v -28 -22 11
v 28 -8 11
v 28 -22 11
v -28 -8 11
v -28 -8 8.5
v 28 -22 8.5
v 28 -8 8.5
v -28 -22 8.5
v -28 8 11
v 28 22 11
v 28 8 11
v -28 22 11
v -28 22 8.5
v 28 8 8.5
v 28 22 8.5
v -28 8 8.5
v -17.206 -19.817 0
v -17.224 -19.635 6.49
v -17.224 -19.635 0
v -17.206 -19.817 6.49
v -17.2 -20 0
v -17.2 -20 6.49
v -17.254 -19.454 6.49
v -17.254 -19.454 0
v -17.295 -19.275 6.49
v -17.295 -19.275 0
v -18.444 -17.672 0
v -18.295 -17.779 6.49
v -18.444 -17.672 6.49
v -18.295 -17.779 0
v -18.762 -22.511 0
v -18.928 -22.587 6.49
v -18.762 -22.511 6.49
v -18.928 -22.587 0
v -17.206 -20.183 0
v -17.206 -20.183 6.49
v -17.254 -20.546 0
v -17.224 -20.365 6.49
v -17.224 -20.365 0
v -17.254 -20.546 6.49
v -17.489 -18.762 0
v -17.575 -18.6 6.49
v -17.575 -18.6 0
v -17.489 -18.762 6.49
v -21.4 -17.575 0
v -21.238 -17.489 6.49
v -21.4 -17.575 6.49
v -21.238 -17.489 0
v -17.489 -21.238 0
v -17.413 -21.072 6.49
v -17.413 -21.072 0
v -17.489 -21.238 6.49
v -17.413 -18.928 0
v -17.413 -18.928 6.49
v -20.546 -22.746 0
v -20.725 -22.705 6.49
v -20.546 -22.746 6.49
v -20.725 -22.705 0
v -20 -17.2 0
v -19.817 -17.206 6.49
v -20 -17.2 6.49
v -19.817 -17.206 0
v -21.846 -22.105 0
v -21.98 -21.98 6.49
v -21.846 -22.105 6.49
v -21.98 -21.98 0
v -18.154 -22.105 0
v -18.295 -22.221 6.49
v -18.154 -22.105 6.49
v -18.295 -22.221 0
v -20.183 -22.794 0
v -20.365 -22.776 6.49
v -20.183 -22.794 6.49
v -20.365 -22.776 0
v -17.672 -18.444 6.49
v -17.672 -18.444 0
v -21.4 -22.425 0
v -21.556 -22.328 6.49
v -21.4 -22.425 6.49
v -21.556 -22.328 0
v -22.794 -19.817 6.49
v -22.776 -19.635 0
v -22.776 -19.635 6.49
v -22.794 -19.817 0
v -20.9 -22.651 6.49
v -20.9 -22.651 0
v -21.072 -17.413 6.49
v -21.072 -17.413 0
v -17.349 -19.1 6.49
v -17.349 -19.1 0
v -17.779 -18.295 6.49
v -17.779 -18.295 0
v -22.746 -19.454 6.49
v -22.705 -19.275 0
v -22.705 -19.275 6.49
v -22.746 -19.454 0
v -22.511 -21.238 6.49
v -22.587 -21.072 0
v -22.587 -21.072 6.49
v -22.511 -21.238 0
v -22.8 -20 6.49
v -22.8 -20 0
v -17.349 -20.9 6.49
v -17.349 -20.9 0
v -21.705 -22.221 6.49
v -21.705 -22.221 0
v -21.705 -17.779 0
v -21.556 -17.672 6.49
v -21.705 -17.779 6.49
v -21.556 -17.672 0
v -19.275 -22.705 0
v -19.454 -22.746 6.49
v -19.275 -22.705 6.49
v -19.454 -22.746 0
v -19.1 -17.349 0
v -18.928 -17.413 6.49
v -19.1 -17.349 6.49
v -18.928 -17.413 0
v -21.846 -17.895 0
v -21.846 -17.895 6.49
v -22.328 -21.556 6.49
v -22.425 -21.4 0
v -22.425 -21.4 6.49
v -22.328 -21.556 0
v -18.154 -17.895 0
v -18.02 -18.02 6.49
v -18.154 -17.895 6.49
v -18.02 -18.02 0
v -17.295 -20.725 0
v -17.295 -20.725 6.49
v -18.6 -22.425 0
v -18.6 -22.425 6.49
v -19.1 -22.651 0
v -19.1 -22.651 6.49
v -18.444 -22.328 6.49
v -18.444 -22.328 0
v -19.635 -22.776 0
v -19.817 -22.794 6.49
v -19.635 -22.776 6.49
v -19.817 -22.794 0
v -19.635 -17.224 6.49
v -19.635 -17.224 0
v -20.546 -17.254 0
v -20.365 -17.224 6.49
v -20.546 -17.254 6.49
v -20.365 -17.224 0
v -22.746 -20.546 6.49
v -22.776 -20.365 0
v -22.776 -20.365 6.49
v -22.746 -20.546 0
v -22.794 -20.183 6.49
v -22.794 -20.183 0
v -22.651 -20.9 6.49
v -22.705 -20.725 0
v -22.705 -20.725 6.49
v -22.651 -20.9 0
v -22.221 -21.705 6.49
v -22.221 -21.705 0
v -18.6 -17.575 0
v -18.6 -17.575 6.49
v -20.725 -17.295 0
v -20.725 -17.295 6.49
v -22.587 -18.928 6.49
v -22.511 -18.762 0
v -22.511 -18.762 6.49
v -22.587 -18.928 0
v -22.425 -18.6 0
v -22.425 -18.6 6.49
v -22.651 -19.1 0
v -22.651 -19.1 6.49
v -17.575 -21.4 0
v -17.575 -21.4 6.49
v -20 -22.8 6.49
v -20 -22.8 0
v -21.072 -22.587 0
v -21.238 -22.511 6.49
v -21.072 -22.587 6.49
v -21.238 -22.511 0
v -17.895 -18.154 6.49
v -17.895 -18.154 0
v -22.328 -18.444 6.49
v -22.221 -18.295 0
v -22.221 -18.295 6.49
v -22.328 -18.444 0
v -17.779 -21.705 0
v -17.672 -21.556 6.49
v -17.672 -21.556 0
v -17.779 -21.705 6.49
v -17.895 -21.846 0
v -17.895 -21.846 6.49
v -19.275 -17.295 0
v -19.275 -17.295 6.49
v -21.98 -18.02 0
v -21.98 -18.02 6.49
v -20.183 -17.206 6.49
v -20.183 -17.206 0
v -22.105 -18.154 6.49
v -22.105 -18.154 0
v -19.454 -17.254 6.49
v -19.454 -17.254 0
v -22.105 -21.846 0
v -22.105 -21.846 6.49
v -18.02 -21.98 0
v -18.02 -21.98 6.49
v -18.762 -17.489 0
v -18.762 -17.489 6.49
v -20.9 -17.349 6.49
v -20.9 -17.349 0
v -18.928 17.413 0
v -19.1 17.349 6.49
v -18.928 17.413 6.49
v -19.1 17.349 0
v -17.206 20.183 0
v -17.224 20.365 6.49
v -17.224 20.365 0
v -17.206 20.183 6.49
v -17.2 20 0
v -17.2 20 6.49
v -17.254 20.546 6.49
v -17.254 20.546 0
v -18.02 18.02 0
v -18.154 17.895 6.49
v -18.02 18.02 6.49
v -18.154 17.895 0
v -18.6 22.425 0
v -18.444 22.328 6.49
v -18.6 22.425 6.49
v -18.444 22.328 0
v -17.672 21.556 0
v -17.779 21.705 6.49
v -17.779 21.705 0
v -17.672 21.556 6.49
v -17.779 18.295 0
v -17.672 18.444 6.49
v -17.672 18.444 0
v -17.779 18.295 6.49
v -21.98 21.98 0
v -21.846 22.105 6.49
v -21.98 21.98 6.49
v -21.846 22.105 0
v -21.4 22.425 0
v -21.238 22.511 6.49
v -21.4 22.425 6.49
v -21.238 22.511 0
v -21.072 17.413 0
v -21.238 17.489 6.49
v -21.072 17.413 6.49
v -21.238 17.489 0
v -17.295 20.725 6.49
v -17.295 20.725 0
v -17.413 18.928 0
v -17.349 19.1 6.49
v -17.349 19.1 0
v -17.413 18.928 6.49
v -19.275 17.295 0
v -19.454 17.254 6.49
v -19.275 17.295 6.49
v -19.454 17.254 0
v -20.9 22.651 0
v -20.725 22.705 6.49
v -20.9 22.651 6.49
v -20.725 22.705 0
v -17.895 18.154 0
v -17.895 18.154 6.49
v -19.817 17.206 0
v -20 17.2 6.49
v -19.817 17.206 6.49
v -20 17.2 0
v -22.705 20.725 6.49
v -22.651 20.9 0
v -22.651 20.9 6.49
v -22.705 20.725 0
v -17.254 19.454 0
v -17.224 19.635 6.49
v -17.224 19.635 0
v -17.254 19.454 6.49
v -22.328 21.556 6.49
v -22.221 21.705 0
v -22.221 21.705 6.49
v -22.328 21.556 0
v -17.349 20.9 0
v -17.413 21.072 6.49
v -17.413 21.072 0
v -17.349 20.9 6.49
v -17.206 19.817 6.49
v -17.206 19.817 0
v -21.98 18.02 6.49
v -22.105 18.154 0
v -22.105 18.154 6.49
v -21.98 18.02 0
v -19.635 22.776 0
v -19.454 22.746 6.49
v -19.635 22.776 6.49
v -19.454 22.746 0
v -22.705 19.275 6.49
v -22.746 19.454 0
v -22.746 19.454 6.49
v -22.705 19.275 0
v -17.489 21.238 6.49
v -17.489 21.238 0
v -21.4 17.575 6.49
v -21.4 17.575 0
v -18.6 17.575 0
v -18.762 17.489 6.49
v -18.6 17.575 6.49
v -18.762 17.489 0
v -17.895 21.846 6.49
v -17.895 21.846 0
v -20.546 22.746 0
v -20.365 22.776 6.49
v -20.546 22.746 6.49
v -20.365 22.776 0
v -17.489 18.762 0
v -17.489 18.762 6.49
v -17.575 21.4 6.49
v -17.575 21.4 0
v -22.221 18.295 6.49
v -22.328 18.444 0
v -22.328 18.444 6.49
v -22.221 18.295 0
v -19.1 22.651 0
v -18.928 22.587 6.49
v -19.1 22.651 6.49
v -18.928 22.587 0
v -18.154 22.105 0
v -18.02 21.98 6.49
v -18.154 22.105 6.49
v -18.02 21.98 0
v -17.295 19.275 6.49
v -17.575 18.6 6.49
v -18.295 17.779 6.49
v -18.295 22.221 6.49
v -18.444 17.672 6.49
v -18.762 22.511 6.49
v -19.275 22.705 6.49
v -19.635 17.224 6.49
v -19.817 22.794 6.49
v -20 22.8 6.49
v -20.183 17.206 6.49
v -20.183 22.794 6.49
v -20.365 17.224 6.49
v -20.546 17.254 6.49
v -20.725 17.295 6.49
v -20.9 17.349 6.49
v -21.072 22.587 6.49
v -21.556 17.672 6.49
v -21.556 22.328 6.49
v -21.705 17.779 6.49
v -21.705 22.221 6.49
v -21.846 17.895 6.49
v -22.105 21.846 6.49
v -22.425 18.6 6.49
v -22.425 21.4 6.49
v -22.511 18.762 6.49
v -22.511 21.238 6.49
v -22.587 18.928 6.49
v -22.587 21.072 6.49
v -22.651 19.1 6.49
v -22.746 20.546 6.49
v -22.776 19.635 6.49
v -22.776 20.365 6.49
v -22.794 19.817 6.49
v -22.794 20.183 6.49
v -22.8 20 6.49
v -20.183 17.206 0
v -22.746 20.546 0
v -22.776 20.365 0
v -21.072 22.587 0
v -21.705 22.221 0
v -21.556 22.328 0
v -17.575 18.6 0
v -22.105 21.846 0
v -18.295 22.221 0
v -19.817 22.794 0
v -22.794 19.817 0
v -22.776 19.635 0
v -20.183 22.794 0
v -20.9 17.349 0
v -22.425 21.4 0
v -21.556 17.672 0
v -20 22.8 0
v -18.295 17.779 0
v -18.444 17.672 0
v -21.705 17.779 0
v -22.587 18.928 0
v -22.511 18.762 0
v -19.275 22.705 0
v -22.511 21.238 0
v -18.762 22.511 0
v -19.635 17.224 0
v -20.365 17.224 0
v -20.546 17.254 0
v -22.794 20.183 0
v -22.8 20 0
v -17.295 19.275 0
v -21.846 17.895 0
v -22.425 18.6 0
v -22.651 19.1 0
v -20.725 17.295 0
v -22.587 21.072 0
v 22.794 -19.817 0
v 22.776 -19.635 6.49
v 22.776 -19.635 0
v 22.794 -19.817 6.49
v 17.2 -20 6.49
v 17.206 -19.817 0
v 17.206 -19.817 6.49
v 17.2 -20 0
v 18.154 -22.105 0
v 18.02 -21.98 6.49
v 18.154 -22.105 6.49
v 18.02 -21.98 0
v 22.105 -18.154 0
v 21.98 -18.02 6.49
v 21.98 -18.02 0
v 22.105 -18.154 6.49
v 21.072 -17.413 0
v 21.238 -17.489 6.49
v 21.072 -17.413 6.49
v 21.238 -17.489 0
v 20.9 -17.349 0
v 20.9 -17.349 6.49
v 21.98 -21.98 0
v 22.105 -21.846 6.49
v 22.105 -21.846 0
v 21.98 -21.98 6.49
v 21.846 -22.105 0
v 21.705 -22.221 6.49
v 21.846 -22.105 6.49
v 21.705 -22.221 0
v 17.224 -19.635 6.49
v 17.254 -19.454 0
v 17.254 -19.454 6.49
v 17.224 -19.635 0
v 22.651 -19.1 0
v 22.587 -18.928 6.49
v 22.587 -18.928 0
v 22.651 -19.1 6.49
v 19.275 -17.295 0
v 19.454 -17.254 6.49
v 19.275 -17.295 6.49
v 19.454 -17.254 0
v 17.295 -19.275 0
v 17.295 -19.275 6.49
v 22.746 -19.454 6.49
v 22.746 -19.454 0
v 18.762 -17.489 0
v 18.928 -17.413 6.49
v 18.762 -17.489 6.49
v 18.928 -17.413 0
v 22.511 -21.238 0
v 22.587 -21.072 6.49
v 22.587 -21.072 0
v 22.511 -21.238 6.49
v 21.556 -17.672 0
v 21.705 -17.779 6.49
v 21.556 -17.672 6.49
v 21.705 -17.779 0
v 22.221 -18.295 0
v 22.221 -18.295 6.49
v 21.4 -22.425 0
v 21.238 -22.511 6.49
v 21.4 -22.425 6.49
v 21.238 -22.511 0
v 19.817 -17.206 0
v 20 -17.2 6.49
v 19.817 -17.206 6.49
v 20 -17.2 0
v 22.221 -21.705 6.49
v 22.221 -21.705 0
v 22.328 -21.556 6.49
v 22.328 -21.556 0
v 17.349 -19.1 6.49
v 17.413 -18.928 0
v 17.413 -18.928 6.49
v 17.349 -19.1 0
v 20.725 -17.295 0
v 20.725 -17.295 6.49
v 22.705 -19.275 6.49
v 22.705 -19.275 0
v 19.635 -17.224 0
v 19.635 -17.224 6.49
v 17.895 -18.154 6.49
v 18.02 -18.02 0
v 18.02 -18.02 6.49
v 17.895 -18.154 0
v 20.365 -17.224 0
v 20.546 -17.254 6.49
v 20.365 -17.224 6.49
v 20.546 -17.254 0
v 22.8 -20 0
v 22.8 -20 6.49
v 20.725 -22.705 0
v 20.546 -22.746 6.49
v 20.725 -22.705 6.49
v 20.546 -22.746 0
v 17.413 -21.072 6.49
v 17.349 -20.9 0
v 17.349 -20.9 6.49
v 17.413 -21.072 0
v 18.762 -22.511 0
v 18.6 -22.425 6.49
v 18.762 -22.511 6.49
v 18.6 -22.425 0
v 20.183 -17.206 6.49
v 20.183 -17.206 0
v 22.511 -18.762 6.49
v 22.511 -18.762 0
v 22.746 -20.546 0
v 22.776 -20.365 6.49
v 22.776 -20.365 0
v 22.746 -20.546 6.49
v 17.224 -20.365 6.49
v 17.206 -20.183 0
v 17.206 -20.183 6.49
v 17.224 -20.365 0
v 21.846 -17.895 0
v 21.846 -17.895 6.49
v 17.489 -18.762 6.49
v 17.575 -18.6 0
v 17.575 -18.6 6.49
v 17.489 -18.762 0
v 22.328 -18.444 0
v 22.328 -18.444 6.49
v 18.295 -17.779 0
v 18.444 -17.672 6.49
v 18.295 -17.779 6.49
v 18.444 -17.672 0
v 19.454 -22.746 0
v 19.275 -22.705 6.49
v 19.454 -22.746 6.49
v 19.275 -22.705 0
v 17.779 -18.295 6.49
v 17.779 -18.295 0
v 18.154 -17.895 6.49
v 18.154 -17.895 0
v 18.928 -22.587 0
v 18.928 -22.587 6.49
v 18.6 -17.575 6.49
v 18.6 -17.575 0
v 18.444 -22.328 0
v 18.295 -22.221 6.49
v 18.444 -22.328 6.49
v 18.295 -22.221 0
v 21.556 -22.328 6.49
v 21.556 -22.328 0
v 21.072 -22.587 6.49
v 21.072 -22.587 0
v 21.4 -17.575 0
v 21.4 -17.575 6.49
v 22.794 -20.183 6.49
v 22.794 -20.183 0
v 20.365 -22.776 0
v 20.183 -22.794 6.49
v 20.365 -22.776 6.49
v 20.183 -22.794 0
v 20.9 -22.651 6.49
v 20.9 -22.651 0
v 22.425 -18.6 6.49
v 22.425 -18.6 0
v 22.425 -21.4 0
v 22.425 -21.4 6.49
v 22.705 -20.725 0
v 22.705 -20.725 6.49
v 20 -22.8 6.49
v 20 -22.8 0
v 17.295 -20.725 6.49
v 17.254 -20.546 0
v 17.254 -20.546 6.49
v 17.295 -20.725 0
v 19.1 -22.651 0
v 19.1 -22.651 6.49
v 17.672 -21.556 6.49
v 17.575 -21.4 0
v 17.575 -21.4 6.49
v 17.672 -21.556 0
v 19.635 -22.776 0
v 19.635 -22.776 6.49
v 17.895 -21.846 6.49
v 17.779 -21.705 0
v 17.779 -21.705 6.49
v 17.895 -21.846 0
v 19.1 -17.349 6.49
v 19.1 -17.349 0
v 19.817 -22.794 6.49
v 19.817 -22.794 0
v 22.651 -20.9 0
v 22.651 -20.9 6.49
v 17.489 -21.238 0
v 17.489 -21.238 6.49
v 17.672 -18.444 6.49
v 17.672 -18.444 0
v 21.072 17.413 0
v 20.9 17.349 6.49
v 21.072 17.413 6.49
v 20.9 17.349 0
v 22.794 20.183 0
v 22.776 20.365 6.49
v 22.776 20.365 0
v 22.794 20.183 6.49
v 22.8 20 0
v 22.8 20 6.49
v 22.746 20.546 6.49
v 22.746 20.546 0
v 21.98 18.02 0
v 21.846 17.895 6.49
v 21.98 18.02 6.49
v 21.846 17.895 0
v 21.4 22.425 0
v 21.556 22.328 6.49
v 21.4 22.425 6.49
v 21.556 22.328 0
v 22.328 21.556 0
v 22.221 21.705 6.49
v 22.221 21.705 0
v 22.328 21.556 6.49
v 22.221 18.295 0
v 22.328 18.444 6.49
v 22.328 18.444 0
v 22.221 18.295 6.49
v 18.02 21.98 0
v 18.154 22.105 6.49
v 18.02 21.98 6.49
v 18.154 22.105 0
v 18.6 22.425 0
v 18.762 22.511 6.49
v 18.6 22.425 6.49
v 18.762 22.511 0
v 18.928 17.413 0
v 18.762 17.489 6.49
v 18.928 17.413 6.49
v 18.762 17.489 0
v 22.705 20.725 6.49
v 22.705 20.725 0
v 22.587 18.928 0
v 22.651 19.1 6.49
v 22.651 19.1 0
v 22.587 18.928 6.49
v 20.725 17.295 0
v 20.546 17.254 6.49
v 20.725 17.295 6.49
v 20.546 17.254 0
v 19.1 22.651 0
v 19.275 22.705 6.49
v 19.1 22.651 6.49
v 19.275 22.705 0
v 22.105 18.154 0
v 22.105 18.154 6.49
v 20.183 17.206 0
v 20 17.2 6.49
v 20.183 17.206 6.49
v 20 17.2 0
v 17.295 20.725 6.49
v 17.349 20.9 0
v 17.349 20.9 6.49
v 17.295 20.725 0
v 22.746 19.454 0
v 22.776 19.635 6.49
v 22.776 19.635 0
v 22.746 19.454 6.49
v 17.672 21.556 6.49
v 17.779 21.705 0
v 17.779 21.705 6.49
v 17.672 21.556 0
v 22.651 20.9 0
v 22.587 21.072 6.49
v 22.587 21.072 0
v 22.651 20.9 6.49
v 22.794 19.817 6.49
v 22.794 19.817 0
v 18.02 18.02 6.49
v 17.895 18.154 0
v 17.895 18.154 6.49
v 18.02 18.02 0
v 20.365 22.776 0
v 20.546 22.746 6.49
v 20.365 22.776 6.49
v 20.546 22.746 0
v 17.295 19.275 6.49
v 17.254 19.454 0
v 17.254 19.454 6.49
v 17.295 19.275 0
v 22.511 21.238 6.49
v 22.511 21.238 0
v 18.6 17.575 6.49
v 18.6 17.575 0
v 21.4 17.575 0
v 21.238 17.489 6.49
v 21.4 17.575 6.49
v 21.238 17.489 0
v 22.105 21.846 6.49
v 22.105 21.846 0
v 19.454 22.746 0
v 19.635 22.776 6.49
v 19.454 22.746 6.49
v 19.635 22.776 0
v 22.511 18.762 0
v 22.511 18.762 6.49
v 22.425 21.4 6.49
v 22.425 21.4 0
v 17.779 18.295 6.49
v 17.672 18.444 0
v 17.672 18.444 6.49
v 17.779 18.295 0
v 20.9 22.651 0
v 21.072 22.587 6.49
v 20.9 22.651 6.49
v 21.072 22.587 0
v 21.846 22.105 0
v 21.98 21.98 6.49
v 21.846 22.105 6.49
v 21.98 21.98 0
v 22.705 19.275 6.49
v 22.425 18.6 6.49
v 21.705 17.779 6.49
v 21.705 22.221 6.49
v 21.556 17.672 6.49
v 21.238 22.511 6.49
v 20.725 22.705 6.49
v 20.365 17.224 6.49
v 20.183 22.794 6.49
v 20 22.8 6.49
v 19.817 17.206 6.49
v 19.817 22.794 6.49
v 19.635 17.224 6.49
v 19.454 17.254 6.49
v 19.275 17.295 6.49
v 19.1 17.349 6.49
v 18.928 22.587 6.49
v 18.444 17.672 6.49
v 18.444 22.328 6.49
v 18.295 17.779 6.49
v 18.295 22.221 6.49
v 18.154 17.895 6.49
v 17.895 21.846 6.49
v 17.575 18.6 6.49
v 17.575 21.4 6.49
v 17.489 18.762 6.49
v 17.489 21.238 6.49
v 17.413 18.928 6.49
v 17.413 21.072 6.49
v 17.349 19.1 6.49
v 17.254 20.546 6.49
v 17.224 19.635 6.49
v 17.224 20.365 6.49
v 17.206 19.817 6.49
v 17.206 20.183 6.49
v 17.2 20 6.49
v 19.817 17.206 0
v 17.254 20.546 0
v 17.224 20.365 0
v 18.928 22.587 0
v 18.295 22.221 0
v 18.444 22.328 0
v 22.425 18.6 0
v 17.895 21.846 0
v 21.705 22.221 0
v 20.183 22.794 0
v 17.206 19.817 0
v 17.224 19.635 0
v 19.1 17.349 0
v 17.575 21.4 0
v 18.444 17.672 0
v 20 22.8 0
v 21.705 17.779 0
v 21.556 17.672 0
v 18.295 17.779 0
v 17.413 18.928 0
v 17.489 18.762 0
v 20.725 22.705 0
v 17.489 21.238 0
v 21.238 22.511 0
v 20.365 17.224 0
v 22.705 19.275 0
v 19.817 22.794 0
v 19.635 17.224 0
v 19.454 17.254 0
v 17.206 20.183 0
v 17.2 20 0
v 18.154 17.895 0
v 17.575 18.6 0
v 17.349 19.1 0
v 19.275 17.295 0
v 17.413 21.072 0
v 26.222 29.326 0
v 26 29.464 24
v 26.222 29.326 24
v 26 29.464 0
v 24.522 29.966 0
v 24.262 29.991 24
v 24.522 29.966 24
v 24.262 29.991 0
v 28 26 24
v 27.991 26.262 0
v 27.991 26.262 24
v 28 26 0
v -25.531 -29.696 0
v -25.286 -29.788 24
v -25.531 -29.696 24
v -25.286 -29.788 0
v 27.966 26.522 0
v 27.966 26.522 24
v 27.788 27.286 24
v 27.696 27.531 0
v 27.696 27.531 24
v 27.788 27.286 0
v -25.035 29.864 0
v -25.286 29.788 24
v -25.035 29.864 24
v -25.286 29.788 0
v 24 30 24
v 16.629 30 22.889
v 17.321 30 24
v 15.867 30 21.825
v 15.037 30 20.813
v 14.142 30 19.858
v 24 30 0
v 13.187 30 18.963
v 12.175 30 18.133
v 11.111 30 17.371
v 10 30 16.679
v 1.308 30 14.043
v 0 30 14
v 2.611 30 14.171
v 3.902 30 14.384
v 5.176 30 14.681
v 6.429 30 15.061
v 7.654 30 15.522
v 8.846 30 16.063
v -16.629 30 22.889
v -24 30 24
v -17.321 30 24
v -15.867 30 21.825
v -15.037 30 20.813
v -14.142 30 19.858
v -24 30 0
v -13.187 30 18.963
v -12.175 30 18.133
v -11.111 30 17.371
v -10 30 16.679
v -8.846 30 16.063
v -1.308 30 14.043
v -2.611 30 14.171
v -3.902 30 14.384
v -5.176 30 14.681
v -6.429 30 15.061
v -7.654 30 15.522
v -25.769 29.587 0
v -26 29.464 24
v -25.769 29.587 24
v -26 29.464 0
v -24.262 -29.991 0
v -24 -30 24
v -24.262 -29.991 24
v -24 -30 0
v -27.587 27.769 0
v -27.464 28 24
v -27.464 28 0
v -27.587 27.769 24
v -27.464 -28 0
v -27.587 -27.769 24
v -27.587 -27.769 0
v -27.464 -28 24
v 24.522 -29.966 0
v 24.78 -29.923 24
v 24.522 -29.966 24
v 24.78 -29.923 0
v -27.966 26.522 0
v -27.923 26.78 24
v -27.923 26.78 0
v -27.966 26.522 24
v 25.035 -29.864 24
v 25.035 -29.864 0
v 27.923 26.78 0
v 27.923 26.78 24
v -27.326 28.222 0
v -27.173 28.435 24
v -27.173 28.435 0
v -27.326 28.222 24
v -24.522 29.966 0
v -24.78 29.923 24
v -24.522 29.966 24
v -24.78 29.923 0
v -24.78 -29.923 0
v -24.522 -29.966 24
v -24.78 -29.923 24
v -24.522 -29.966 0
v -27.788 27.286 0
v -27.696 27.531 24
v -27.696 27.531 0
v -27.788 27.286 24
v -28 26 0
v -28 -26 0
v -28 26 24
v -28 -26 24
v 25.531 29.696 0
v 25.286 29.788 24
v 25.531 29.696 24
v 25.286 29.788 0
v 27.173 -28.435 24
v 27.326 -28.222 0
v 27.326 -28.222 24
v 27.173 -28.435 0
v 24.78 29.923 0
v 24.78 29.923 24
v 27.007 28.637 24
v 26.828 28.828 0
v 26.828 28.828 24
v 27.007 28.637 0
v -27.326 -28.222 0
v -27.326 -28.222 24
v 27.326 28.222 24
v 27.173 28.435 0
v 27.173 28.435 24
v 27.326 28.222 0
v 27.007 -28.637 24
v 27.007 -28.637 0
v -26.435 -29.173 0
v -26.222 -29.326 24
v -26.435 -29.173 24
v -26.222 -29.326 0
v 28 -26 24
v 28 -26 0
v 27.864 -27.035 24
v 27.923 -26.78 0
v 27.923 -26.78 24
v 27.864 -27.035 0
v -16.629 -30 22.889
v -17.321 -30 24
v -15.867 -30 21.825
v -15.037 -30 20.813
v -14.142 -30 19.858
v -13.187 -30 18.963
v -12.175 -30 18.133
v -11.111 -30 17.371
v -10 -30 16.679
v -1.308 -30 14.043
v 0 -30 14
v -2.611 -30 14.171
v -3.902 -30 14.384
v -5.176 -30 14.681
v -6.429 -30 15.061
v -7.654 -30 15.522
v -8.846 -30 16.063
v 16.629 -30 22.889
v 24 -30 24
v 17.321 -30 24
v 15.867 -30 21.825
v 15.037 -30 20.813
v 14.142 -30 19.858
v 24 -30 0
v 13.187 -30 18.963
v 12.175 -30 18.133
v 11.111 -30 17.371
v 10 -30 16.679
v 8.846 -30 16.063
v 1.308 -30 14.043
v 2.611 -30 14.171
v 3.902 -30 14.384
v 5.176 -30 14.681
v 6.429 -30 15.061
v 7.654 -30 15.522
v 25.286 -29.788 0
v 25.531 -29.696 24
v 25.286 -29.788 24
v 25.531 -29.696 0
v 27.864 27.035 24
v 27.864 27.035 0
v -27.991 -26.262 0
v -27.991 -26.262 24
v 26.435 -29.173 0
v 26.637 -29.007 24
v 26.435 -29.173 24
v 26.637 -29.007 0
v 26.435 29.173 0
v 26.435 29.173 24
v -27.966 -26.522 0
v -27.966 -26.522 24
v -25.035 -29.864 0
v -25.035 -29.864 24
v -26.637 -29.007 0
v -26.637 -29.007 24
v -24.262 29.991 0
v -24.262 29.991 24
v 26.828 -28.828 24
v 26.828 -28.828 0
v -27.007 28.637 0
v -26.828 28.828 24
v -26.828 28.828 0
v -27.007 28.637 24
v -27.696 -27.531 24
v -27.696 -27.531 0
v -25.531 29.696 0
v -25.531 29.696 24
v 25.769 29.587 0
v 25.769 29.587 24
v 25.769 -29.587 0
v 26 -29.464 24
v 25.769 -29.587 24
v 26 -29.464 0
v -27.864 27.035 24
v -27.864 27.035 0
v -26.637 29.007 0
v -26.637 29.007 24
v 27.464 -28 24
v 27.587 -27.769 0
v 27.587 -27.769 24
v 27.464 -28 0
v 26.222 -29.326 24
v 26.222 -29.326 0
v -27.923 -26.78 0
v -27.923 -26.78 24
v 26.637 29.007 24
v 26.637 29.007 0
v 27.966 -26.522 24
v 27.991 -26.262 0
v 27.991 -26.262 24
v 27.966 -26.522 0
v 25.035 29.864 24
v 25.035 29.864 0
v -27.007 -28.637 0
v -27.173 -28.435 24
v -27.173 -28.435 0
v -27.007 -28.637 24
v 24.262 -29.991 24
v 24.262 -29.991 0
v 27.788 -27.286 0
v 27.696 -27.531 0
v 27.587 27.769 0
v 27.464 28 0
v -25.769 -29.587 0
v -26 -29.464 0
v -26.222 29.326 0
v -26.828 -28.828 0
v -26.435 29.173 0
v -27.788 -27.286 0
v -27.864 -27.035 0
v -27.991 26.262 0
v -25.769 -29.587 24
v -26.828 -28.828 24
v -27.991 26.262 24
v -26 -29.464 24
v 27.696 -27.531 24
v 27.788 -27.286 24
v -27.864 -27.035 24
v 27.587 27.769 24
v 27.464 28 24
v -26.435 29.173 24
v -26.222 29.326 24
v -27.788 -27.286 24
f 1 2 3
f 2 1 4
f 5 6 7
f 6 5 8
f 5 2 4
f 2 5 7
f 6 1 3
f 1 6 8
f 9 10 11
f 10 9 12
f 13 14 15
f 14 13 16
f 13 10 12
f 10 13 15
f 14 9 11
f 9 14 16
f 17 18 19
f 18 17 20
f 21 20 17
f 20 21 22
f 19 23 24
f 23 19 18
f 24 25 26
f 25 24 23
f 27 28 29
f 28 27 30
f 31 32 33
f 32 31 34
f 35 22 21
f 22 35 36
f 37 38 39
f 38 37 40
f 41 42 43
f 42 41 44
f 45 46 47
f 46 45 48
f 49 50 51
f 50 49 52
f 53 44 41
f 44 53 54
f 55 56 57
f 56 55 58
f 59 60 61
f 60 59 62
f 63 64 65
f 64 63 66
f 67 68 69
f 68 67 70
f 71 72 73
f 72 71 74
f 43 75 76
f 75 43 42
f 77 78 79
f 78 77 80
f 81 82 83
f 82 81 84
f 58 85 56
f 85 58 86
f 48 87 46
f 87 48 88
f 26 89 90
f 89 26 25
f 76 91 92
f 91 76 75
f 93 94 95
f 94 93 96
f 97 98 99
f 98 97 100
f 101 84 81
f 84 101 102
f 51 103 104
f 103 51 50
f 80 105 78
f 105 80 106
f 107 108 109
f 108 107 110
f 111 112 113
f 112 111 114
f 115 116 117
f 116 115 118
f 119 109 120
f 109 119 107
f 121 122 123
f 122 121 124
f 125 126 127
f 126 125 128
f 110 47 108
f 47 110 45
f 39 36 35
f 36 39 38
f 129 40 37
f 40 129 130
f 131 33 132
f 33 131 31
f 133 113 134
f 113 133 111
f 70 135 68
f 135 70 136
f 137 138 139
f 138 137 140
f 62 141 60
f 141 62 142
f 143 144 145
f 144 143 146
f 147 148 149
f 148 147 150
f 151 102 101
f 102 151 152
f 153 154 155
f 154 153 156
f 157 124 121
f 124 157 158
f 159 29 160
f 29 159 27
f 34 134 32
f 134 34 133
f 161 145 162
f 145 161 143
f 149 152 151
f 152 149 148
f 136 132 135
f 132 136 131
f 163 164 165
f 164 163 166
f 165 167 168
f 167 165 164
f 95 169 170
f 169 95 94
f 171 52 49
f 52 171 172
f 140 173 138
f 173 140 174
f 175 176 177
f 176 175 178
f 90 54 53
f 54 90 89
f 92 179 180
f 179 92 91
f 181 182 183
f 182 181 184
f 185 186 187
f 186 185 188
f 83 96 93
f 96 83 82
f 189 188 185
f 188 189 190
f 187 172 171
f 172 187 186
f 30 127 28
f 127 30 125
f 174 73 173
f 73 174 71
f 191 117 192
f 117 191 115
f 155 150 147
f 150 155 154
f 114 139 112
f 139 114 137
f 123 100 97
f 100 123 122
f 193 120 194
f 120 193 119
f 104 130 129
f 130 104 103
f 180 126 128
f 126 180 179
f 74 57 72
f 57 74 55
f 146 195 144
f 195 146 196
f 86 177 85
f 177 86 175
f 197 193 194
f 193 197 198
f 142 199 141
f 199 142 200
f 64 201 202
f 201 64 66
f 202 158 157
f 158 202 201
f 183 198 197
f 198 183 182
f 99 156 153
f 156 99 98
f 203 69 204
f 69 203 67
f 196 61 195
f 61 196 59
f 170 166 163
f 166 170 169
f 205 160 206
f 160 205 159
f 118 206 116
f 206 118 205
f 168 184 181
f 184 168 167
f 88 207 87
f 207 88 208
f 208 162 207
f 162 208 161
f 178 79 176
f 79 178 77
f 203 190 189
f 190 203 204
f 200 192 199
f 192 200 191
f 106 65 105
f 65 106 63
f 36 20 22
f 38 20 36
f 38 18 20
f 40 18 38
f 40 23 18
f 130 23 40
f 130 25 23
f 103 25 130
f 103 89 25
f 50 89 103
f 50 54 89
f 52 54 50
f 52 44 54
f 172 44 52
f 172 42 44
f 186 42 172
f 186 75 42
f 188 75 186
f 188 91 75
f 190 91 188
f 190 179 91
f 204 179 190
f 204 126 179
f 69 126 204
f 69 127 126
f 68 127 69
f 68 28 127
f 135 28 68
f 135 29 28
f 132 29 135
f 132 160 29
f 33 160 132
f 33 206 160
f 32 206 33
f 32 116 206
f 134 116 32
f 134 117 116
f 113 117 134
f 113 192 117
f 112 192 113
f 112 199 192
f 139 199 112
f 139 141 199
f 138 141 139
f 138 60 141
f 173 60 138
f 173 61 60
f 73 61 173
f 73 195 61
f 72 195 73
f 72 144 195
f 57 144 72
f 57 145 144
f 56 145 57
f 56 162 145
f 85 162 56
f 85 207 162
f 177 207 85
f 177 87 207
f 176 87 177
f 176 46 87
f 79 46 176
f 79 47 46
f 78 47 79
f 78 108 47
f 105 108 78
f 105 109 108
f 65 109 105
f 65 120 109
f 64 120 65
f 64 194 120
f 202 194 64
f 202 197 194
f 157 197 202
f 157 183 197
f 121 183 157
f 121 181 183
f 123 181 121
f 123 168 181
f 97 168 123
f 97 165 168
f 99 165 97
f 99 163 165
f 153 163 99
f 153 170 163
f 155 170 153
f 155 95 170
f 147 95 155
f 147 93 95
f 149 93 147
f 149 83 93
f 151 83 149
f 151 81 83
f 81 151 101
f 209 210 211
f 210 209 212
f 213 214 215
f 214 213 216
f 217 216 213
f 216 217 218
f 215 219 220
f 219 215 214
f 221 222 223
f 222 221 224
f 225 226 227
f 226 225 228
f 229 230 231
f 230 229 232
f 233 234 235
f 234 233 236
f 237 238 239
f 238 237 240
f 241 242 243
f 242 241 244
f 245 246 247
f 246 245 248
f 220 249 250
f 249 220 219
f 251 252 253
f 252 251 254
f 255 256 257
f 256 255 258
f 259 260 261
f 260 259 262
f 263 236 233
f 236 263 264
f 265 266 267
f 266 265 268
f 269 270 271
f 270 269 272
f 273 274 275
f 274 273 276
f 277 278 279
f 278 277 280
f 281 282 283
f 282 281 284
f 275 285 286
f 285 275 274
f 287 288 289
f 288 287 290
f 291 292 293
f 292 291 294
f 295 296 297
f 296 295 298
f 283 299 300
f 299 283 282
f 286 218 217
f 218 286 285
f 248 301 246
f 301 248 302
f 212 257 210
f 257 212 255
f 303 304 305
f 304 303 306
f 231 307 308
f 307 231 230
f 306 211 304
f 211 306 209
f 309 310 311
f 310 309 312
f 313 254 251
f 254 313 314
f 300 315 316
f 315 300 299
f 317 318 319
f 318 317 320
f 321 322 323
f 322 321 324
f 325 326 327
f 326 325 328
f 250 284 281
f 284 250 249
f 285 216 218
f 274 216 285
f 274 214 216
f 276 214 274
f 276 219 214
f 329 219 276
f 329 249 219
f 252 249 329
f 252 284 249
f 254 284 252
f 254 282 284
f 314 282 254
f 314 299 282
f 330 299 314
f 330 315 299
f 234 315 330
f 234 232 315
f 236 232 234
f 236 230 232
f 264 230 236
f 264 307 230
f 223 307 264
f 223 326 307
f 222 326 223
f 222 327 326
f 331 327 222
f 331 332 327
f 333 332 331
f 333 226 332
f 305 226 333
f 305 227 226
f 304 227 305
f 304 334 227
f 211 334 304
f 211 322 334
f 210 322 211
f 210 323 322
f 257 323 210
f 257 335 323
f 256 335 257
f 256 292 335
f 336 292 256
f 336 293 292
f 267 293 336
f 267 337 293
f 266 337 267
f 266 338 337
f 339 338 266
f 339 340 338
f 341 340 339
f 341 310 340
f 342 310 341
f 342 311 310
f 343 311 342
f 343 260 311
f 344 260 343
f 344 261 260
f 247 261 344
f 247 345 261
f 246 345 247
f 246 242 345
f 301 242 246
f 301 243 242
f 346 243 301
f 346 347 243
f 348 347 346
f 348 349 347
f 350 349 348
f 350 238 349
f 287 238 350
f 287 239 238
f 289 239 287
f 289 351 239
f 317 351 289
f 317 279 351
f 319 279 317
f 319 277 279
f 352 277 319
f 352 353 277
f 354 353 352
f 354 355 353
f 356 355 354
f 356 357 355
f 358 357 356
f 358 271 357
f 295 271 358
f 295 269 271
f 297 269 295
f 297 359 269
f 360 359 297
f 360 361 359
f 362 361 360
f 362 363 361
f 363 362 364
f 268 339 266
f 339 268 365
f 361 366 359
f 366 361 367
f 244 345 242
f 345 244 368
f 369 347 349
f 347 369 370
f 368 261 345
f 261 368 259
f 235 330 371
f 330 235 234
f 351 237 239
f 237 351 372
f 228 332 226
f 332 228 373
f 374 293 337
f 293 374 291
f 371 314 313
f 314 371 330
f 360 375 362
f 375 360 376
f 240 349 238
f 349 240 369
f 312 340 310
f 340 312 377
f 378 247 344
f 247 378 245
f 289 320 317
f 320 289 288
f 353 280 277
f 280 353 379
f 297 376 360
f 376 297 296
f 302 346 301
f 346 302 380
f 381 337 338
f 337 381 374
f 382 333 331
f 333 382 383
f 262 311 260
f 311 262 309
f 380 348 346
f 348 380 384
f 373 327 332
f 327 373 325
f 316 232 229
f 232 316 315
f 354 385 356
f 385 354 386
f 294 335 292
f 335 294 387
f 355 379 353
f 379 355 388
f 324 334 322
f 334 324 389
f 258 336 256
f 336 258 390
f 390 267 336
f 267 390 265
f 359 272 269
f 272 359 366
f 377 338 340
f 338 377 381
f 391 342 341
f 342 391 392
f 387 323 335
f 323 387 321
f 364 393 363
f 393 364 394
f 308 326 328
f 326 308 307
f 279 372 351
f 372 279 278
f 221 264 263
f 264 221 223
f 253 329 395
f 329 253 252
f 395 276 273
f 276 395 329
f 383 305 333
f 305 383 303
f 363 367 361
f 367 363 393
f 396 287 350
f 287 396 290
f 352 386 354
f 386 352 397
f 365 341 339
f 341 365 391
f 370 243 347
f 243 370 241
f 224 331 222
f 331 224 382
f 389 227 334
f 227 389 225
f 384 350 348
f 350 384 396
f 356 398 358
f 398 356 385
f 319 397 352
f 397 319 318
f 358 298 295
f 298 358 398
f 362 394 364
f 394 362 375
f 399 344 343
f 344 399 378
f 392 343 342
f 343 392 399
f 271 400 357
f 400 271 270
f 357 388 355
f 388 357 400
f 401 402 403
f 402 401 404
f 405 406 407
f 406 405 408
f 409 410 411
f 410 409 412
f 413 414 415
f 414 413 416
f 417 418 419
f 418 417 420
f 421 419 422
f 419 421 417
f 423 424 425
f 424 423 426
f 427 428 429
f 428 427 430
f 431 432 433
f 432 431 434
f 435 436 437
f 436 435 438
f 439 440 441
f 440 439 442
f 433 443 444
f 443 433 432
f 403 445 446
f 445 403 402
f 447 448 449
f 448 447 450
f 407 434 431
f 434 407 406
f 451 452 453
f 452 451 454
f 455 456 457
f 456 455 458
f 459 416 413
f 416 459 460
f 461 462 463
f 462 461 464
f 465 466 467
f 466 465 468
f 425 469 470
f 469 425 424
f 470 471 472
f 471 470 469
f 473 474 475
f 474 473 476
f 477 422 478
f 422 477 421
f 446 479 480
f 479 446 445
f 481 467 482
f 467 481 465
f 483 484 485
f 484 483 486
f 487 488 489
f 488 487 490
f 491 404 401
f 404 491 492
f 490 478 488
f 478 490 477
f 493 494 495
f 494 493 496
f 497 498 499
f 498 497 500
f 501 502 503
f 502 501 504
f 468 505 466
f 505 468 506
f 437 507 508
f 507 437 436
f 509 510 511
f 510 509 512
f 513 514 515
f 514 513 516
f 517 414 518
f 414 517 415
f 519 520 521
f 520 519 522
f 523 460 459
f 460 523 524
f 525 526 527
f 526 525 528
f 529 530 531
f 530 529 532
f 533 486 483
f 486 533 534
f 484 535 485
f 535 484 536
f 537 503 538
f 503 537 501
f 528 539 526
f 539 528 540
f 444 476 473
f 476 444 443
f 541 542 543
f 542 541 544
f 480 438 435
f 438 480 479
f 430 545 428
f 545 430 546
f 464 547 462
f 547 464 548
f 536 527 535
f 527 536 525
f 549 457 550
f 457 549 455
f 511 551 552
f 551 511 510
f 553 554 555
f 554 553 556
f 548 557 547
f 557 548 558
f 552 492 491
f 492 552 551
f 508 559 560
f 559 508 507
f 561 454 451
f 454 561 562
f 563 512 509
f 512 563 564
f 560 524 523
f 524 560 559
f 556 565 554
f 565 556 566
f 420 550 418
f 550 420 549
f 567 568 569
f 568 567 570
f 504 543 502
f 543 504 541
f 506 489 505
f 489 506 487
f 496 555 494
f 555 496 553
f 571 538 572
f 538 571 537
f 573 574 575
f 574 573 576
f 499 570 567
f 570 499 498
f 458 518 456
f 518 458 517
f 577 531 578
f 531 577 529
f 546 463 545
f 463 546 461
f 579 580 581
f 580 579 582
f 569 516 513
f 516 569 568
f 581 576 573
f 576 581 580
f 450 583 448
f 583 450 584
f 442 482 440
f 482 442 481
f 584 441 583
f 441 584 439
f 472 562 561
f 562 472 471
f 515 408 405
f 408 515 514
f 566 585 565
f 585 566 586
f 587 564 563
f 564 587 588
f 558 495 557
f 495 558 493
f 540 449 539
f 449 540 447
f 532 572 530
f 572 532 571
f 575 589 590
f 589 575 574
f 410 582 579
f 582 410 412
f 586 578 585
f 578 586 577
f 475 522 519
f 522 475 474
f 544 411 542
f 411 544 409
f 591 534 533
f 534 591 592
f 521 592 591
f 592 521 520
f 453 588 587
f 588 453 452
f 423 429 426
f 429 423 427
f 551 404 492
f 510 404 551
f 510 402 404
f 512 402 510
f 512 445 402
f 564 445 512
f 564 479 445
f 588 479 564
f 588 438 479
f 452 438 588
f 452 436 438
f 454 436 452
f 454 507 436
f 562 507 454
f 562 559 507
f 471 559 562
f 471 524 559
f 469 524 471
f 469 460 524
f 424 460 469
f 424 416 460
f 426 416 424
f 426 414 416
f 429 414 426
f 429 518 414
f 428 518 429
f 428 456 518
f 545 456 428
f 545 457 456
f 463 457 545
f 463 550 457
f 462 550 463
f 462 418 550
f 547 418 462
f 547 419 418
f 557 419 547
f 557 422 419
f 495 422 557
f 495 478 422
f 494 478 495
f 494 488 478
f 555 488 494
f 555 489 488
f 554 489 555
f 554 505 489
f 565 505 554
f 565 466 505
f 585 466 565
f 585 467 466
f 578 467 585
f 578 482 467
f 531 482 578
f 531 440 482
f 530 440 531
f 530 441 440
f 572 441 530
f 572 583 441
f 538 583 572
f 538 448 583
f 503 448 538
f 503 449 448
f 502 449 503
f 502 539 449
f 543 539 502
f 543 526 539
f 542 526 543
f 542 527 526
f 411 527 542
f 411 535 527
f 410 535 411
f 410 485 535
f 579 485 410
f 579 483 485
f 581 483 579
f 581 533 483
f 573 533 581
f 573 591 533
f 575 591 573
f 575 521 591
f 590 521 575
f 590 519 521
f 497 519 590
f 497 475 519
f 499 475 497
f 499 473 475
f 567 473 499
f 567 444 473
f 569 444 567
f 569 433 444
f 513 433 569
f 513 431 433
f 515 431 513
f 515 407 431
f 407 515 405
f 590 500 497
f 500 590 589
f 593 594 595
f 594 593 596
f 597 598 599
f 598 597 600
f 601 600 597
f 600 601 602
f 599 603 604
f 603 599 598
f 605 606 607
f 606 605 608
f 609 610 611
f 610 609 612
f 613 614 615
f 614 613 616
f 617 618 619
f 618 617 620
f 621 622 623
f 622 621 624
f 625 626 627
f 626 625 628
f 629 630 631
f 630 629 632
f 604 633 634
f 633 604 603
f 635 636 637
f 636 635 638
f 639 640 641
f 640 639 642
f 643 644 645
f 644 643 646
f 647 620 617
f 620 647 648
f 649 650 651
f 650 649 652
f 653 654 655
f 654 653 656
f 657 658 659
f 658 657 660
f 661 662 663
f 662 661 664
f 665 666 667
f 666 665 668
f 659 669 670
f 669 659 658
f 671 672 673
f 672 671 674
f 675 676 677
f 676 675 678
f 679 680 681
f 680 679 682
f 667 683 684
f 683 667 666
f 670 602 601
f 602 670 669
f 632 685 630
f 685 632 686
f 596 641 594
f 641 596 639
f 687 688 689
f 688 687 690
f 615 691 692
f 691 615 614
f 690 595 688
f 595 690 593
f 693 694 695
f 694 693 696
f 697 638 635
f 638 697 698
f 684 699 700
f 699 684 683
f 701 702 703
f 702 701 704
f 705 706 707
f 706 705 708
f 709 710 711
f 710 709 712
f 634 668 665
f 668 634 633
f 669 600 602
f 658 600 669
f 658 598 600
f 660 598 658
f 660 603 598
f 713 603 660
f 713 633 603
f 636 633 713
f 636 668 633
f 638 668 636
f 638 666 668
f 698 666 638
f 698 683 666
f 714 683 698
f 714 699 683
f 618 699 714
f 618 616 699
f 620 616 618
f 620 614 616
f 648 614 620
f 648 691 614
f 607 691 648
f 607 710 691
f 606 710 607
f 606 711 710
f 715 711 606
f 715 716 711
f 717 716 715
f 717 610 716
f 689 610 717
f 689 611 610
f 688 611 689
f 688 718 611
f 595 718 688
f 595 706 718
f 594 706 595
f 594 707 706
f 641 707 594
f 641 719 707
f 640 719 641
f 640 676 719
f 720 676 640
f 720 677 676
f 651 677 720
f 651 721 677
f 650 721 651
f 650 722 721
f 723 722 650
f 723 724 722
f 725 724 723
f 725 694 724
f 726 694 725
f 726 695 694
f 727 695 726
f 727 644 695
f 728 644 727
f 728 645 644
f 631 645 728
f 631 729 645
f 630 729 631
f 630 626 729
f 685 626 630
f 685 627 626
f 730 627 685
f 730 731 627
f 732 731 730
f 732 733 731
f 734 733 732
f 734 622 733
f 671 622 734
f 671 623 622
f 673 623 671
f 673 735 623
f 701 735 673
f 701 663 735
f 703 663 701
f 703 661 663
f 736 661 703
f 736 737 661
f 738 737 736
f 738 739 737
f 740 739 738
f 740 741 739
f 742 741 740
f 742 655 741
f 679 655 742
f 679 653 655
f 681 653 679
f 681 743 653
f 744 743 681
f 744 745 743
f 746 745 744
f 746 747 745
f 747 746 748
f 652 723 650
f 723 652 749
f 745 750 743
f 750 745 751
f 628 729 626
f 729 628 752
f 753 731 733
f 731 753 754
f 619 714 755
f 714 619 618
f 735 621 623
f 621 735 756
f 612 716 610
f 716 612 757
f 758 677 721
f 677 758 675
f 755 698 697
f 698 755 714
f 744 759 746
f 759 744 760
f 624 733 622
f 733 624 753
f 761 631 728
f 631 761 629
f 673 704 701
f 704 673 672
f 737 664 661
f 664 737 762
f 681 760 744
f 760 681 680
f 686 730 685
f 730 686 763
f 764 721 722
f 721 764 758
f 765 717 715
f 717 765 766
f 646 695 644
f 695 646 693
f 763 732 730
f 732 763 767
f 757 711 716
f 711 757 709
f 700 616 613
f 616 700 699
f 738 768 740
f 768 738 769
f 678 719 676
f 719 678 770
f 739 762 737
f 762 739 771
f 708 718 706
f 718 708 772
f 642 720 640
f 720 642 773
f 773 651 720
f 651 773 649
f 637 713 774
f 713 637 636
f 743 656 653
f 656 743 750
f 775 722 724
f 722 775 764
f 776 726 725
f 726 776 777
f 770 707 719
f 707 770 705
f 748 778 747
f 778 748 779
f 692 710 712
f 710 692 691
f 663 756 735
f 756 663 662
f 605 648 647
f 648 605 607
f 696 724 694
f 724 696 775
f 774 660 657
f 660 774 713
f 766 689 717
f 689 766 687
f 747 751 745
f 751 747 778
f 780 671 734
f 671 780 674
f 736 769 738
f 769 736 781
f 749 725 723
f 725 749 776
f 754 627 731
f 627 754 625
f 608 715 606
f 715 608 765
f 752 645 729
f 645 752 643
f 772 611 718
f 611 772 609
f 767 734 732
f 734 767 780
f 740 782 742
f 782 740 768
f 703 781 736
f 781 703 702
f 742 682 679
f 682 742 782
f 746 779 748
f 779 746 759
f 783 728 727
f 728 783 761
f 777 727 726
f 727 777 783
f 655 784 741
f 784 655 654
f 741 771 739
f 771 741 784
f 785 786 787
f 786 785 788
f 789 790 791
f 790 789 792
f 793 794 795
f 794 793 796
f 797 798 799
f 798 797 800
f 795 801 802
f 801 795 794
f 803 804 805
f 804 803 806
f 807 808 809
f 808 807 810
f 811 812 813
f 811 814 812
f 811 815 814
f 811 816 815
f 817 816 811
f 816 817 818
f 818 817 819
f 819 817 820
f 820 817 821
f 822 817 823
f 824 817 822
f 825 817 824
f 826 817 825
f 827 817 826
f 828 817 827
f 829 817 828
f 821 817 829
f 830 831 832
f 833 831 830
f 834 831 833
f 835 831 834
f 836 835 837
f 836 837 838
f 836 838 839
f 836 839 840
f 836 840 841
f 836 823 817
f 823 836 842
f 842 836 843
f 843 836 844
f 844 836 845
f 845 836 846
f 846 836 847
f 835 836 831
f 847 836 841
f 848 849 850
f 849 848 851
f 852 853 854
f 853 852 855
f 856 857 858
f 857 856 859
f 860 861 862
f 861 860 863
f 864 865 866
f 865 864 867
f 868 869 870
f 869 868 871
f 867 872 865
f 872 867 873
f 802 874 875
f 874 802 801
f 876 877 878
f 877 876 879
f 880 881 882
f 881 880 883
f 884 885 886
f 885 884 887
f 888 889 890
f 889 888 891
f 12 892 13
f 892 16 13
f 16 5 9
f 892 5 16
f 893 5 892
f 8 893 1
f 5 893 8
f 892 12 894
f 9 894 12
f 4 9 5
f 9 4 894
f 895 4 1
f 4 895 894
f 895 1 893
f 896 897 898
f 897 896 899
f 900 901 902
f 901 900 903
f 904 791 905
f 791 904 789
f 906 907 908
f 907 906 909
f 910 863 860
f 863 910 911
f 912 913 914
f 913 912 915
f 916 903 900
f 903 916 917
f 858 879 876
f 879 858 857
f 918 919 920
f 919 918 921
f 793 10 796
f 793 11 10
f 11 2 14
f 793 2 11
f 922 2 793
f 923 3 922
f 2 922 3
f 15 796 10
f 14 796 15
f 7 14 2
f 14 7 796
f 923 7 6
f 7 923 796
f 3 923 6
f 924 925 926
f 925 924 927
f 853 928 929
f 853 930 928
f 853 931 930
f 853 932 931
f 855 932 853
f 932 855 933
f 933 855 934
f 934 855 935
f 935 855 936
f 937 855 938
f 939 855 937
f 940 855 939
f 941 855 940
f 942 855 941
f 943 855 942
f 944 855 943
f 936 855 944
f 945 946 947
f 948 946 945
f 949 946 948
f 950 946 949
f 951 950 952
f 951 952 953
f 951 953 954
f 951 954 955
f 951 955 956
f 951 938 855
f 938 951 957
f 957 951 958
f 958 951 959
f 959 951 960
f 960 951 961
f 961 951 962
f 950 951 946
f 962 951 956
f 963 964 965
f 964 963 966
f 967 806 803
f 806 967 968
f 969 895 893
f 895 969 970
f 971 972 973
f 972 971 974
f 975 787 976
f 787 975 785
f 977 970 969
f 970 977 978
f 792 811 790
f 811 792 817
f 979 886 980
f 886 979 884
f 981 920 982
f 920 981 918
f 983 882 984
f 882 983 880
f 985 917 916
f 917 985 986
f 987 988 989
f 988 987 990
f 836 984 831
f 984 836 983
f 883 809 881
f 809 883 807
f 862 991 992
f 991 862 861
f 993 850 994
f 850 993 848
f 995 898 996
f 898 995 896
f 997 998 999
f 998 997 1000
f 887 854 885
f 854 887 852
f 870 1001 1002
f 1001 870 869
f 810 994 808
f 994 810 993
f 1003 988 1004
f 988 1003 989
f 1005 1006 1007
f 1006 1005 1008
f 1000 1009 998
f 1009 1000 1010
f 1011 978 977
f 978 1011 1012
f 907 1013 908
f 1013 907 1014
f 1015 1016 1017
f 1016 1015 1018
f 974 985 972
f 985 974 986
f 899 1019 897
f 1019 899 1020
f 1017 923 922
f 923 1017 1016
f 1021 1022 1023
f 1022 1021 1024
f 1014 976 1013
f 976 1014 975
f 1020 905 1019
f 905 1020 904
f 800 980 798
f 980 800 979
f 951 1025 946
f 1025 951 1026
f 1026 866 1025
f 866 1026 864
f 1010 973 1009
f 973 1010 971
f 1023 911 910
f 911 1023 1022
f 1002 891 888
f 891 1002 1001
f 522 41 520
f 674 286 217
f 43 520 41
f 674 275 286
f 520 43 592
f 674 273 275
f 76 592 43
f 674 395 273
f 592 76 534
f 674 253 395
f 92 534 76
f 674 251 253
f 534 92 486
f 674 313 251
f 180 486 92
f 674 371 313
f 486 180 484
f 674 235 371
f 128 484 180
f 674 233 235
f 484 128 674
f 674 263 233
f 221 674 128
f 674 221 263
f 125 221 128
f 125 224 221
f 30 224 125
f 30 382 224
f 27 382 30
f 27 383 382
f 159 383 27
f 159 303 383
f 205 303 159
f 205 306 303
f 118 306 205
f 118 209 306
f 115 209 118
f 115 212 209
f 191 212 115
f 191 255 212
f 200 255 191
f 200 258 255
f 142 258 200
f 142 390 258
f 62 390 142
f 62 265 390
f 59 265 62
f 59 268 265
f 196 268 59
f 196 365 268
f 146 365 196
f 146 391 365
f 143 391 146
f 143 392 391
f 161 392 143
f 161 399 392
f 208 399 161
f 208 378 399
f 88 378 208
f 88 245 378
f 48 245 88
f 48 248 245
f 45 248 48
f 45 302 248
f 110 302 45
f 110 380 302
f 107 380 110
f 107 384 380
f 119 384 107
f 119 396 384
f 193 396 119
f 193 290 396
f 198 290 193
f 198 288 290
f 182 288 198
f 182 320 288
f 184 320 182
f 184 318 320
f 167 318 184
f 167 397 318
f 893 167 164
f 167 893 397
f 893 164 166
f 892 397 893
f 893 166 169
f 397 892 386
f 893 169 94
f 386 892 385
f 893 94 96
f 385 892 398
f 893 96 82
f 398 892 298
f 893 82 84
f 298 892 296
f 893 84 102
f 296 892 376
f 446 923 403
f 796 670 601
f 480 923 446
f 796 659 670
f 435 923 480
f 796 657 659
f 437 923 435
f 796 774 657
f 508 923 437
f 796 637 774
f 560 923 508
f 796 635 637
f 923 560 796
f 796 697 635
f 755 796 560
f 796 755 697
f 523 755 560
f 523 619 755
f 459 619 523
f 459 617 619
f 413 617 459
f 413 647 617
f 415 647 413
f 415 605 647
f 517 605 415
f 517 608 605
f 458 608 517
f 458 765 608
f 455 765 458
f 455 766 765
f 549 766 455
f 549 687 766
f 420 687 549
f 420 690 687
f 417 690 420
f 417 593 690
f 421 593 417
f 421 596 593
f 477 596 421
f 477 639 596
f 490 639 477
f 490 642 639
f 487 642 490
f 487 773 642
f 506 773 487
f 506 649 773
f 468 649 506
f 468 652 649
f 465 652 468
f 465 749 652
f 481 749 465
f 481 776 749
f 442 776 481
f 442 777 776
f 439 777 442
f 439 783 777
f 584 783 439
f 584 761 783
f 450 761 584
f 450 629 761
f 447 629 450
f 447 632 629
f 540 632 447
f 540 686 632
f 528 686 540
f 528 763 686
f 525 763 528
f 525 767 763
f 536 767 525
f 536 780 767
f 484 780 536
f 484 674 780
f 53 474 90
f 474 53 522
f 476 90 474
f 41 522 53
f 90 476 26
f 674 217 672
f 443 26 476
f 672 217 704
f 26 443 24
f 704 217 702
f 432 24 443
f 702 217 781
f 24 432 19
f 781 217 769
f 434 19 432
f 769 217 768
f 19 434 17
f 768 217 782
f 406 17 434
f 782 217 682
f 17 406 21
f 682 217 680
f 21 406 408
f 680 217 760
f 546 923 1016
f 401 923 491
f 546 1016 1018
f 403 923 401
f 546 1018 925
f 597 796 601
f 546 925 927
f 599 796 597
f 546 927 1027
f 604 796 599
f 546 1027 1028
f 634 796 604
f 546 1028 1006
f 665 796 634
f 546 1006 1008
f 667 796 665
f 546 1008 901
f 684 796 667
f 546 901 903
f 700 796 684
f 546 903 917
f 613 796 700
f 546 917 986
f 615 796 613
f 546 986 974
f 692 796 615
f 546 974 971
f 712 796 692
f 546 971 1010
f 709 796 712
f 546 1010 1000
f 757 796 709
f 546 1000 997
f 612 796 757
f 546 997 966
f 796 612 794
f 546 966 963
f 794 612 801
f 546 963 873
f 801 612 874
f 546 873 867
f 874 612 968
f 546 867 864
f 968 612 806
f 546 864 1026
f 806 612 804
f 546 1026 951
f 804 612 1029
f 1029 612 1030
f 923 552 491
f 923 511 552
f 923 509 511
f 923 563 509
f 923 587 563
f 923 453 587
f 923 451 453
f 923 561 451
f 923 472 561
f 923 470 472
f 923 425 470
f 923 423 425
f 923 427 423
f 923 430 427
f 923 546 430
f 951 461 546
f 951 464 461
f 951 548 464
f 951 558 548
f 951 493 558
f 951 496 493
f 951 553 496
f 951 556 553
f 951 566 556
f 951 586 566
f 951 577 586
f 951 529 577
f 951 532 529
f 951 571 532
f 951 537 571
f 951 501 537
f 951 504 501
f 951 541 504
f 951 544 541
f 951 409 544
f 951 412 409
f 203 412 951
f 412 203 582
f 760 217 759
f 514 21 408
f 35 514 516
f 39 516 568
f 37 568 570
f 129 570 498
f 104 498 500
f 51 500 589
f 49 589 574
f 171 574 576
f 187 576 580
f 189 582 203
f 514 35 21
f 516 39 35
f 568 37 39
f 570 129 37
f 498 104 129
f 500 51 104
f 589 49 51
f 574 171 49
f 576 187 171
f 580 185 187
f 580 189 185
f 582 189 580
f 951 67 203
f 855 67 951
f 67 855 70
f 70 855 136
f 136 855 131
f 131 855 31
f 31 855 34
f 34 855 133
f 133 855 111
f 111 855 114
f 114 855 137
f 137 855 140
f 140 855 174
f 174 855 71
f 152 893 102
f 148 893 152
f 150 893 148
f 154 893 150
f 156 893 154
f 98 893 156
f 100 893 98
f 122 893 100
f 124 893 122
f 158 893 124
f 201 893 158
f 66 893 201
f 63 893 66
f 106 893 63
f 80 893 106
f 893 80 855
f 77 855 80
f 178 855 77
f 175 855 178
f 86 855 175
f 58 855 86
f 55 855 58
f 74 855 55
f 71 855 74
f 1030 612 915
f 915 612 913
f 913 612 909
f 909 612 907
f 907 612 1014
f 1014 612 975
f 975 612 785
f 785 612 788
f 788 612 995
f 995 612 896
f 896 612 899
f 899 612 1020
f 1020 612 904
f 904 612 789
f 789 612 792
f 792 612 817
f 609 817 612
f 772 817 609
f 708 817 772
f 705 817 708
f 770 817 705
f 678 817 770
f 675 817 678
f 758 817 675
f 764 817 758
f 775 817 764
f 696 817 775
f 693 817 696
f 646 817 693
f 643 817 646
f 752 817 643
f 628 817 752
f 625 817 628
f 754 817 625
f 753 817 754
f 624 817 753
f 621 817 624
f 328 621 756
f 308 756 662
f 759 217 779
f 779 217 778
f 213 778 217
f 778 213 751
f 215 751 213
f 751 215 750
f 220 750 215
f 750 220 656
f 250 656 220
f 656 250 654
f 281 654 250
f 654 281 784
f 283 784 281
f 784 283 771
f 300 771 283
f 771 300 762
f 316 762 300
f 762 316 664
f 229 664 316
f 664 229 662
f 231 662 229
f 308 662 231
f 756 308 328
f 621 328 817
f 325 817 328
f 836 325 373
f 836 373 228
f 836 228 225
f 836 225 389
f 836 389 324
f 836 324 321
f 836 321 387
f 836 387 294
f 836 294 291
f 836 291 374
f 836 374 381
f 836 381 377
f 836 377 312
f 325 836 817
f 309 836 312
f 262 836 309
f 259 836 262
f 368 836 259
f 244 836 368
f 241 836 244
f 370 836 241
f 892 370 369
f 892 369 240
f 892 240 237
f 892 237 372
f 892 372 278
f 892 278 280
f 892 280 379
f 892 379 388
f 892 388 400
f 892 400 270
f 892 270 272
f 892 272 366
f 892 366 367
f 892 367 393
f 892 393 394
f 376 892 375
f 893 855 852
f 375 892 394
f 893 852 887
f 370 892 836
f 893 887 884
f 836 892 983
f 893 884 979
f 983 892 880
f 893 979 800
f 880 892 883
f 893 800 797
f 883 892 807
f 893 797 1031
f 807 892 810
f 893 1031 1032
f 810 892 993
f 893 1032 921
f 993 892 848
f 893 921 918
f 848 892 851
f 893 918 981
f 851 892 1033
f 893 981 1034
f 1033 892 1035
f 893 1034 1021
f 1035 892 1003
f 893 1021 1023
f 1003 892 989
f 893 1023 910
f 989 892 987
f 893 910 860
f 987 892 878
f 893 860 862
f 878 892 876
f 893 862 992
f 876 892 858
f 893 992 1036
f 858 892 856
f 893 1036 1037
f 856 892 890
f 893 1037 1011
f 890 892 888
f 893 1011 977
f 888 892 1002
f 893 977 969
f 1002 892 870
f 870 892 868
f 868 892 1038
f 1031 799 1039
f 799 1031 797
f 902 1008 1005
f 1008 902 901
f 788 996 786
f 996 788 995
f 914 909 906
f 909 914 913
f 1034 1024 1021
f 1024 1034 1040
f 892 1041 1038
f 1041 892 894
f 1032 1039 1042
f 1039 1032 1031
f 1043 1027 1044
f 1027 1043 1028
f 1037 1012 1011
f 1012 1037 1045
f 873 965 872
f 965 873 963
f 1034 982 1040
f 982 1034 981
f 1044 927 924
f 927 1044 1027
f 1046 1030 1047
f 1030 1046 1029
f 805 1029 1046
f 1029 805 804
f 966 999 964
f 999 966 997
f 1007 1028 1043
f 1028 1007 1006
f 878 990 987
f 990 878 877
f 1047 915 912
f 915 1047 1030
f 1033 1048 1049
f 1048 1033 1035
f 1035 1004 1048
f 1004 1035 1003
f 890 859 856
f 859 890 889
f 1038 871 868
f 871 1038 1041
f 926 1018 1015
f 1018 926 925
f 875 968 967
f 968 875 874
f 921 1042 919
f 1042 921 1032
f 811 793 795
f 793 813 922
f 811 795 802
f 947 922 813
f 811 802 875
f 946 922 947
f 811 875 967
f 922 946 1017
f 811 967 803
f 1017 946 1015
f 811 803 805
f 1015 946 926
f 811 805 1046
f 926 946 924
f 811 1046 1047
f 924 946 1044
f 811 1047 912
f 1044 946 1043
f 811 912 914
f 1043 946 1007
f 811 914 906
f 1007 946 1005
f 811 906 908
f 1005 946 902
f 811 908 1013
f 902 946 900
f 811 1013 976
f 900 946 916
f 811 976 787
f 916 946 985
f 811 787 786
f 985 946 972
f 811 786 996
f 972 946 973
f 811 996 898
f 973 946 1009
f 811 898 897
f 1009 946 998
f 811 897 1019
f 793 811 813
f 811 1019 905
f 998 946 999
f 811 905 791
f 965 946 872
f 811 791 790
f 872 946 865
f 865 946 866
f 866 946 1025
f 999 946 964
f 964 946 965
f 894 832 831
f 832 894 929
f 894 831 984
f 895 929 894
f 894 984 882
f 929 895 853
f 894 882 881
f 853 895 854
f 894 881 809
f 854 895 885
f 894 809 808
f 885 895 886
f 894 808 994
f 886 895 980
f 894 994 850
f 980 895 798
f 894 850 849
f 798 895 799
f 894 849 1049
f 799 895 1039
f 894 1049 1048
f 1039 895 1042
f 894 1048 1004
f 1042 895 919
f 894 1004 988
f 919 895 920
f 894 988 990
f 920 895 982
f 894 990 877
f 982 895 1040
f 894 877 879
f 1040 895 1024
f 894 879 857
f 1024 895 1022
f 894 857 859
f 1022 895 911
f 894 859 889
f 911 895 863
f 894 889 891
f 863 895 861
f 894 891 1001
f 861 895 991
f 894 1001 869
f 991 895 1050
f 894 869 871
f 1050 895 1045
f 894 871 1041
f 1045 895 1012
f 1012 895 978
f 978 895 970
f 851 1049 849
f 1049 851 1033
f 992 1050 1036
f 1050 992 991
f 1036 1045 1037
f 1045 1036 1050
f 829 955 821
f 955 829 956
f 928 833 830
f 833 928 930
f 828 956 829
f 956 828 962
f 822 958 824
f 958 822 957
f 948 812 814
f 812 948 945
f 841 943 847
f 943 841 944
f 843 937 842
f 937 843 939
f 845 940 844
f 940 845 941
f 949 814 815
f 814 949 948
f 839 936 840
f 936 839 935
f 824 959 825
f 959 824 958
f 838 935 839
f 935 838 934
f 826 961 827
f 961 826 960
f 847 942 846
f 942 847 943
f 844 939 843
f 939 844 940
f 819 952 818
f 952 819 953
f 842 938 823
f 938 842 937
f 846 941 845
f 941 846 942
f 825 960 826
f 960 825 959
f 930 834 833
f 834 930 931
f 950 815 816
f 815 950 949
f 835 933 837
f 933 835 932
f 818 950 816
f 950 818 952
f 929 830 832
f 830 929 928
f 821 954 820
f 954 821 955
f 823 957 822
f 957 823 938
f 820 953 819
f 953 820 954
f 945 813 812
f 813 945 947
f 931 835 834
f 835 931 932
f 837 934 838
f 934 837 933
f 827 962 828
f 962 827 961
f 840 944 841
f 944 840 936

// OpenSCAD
// file: common.scad
// Shared dimensions for the weather station parts. Every part that goes on the pole
// bolts to a pole saddle (pole_saddle.scad) through the same 40 x 40 mm M4 pattern.
// Print in PETG (or ASA): 0.2 mm layers, 4 walls, 30 % gyroid unless a file says otherwise.

$fn = 96;

pole_d = 40;            // outside diameter of your pole, mm (32-40 typical)
mount_pitch = 40;       // M4 bolt square shared by every part
m4_clear = 4.5;         // M4 clearance hole
m4_insert_d = 5.6;      // hole for an M4 x 6 heat-set insert (check your inserts)
m4_insert_h = 6.5;
m5_clear = 5.5;         // M5 rods of the radiation shield
clamp_w = 14;           // worm-drive hose clamp band width + 1 mm
clamp_t = 2.5;          // band thickness + clearance

// Four holes on the shared mounting square, centred on the origin, along Z.
module mount_holes(d = m4_clear, h = 50) {
    for (x = [-1, 1], y = [-1, 1])
        translate([x * mount_pitch / 2, y * mount_pitch / 2, -h / 2])
            cylinder(d = d, h = h);
}

module rounded_box(size, r = 4) {
    hull()
        for (x = [r, size[0] - r], y = [r, size[1] - r])
            translate([x, y, 0]) cylinder(r = r, h = size[2]);
}
// main file
// Pole saddle: a curved block that a stainless worm-drive hose clamp holds against the pole.
// The flat face carries four M4 heat-set inserts on the shared 40 x 40 mm square, where the
// box, the shield arm, the panel bracket and the rain gauge plate bolt on.
// Print flat face down. Four are needed (box, shield, panel, wind arm or rain post).

include <common.scad>

saddle_w = 56;      // across the pole
saddle_h = 60;      // along the pole
saddle_t = 14;      // at the thinnest point, between the pole and the flat face

module pole_saddle() {
    difference() {
        translate([-saddle_w / 2, -saddle_h / 2, 0])
            rounded_box([saddle_w, saddle_h, saddle_t + pole_d / 4], r = 4);
        // Pole groove
        translate([0, 0, saddle_t + pole_d / 2])
            rotate([90, 0, 0]) cylinder(d = pole_d, h = saddle_h + 2, center = true);
        // Two slots for the hose clamps
        for (y = [-saddle_h / 4, saddle_h / 4])
            translate([-saddle_w / 2 - 1, y - clamp_w / 2, saddle_t - clamp_t - 3])
                cube([saddle_w + 2, clamp_w, clamp_t]);
        // Heat-set inserts from the flat face
        for (x = [-1, 1], y = [-1, 1])
            translate([x * mount_pitch / 2, y * mount_pitch / 2, -0.01])
                cylinder(d = m4_insert_d, h = m4_insert_h);
    }
}

pole_saddle();
